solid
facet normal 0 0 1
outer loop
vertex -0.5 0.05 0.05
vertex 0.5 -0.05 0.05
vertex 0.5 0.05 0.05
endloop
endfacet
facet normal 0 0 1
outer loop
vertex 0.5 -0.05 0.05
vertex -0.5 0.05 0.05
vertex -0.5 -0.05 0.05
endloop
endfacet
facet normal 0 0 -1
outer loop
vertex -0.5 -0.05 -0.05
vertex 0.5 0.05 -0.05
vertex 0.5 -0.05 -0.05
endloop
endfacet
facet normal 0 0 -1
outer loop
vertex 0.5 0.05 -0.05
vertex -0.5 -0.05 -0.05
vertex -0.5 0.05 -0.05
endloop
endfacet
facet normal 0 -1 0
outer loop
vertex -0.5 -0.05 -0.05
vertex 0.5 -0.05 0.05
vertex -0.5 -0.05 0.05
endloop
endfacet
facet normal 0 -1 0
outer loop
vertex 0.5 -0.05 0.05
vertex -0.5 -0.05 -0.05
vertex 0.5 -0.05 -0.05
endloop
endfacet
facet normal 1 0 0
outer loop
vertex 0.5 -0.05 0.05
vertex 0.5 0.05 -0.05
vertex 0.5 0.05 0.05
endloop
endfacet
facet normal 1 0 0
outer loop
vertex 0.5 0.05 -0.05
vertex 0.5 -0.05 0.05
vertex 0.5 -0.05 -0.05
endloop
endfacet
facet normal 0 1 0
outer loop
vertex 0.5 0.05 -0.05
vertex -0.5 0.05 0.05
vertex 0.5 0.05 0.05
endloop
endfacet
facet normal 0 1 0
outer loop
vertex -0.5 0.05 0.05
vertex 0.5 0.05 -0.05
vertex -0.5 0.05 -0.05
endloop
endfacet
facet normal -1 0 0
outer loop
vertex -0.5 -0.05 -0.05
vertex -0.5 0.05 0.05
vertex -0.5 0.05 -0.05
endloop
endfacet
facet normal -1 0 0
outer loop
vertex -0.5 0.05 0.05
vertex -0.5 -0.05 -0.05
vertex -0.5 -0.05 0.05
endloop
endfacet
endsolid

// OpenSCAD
include <../openscad2calculix.scad>

length = 1;
width = 0.1;
height = 0.1;
epsilon = 0.01;

os2cx_material_elastic_simple(
    "steel",
    youngs_modulus=[209, "GPa"],
    poissons_ratio=0.3,
    density=[7600, "kg/m^3"]);

os2cx_mesh("beam", material="steel") {
  cube([length, width, height], center=true);
}

os2cx_select_surface("anchored_end", [-1, 0, 0], 45) {
    translate([-length/2, 0, 0])
        cube([epsilon, width+epsilon, height+epsilon], center=true);
}

os2cx_select_surface("loaded_end", [1, 0, 0], 45) {
    translate([length/2, 0, 0])
        cube([epsilon, width+epsilon, height+epsilon], center=true);
}

os2cx_select_surface_internal("halfway_section", [-1, 0, 0], 45) {
    translate([epsilon/2, 0, 0])
        cube([epsilon, width+epsilon, height+epsilon], center=true);
}

os2cx_load_surface("load", "loaded_end", force_total=[[0, 0, -1], "kN"]);

os2cx_analysis_custom([
    "*INCLUDE, INPUT=objects.inp",
    "*STEP",
    "*STATIC",
    "*BOUNDARY",
    [["nset", "anchored_end"], ",1,3"],
    "*CLOAD",
    ["*INCLUDE, INPUT=", ["cload_file", "load"]],
    "*NODE FILE",
    "U",
    "*EL FILE",
    "S",
    ["*SECTION PRINT,SURFACE=", ["surface", "halfway_section"], ",NAME=SP1"],
    "SOF",
    "*END STEP"
], unit_system=["m", "kg", "s"]);
